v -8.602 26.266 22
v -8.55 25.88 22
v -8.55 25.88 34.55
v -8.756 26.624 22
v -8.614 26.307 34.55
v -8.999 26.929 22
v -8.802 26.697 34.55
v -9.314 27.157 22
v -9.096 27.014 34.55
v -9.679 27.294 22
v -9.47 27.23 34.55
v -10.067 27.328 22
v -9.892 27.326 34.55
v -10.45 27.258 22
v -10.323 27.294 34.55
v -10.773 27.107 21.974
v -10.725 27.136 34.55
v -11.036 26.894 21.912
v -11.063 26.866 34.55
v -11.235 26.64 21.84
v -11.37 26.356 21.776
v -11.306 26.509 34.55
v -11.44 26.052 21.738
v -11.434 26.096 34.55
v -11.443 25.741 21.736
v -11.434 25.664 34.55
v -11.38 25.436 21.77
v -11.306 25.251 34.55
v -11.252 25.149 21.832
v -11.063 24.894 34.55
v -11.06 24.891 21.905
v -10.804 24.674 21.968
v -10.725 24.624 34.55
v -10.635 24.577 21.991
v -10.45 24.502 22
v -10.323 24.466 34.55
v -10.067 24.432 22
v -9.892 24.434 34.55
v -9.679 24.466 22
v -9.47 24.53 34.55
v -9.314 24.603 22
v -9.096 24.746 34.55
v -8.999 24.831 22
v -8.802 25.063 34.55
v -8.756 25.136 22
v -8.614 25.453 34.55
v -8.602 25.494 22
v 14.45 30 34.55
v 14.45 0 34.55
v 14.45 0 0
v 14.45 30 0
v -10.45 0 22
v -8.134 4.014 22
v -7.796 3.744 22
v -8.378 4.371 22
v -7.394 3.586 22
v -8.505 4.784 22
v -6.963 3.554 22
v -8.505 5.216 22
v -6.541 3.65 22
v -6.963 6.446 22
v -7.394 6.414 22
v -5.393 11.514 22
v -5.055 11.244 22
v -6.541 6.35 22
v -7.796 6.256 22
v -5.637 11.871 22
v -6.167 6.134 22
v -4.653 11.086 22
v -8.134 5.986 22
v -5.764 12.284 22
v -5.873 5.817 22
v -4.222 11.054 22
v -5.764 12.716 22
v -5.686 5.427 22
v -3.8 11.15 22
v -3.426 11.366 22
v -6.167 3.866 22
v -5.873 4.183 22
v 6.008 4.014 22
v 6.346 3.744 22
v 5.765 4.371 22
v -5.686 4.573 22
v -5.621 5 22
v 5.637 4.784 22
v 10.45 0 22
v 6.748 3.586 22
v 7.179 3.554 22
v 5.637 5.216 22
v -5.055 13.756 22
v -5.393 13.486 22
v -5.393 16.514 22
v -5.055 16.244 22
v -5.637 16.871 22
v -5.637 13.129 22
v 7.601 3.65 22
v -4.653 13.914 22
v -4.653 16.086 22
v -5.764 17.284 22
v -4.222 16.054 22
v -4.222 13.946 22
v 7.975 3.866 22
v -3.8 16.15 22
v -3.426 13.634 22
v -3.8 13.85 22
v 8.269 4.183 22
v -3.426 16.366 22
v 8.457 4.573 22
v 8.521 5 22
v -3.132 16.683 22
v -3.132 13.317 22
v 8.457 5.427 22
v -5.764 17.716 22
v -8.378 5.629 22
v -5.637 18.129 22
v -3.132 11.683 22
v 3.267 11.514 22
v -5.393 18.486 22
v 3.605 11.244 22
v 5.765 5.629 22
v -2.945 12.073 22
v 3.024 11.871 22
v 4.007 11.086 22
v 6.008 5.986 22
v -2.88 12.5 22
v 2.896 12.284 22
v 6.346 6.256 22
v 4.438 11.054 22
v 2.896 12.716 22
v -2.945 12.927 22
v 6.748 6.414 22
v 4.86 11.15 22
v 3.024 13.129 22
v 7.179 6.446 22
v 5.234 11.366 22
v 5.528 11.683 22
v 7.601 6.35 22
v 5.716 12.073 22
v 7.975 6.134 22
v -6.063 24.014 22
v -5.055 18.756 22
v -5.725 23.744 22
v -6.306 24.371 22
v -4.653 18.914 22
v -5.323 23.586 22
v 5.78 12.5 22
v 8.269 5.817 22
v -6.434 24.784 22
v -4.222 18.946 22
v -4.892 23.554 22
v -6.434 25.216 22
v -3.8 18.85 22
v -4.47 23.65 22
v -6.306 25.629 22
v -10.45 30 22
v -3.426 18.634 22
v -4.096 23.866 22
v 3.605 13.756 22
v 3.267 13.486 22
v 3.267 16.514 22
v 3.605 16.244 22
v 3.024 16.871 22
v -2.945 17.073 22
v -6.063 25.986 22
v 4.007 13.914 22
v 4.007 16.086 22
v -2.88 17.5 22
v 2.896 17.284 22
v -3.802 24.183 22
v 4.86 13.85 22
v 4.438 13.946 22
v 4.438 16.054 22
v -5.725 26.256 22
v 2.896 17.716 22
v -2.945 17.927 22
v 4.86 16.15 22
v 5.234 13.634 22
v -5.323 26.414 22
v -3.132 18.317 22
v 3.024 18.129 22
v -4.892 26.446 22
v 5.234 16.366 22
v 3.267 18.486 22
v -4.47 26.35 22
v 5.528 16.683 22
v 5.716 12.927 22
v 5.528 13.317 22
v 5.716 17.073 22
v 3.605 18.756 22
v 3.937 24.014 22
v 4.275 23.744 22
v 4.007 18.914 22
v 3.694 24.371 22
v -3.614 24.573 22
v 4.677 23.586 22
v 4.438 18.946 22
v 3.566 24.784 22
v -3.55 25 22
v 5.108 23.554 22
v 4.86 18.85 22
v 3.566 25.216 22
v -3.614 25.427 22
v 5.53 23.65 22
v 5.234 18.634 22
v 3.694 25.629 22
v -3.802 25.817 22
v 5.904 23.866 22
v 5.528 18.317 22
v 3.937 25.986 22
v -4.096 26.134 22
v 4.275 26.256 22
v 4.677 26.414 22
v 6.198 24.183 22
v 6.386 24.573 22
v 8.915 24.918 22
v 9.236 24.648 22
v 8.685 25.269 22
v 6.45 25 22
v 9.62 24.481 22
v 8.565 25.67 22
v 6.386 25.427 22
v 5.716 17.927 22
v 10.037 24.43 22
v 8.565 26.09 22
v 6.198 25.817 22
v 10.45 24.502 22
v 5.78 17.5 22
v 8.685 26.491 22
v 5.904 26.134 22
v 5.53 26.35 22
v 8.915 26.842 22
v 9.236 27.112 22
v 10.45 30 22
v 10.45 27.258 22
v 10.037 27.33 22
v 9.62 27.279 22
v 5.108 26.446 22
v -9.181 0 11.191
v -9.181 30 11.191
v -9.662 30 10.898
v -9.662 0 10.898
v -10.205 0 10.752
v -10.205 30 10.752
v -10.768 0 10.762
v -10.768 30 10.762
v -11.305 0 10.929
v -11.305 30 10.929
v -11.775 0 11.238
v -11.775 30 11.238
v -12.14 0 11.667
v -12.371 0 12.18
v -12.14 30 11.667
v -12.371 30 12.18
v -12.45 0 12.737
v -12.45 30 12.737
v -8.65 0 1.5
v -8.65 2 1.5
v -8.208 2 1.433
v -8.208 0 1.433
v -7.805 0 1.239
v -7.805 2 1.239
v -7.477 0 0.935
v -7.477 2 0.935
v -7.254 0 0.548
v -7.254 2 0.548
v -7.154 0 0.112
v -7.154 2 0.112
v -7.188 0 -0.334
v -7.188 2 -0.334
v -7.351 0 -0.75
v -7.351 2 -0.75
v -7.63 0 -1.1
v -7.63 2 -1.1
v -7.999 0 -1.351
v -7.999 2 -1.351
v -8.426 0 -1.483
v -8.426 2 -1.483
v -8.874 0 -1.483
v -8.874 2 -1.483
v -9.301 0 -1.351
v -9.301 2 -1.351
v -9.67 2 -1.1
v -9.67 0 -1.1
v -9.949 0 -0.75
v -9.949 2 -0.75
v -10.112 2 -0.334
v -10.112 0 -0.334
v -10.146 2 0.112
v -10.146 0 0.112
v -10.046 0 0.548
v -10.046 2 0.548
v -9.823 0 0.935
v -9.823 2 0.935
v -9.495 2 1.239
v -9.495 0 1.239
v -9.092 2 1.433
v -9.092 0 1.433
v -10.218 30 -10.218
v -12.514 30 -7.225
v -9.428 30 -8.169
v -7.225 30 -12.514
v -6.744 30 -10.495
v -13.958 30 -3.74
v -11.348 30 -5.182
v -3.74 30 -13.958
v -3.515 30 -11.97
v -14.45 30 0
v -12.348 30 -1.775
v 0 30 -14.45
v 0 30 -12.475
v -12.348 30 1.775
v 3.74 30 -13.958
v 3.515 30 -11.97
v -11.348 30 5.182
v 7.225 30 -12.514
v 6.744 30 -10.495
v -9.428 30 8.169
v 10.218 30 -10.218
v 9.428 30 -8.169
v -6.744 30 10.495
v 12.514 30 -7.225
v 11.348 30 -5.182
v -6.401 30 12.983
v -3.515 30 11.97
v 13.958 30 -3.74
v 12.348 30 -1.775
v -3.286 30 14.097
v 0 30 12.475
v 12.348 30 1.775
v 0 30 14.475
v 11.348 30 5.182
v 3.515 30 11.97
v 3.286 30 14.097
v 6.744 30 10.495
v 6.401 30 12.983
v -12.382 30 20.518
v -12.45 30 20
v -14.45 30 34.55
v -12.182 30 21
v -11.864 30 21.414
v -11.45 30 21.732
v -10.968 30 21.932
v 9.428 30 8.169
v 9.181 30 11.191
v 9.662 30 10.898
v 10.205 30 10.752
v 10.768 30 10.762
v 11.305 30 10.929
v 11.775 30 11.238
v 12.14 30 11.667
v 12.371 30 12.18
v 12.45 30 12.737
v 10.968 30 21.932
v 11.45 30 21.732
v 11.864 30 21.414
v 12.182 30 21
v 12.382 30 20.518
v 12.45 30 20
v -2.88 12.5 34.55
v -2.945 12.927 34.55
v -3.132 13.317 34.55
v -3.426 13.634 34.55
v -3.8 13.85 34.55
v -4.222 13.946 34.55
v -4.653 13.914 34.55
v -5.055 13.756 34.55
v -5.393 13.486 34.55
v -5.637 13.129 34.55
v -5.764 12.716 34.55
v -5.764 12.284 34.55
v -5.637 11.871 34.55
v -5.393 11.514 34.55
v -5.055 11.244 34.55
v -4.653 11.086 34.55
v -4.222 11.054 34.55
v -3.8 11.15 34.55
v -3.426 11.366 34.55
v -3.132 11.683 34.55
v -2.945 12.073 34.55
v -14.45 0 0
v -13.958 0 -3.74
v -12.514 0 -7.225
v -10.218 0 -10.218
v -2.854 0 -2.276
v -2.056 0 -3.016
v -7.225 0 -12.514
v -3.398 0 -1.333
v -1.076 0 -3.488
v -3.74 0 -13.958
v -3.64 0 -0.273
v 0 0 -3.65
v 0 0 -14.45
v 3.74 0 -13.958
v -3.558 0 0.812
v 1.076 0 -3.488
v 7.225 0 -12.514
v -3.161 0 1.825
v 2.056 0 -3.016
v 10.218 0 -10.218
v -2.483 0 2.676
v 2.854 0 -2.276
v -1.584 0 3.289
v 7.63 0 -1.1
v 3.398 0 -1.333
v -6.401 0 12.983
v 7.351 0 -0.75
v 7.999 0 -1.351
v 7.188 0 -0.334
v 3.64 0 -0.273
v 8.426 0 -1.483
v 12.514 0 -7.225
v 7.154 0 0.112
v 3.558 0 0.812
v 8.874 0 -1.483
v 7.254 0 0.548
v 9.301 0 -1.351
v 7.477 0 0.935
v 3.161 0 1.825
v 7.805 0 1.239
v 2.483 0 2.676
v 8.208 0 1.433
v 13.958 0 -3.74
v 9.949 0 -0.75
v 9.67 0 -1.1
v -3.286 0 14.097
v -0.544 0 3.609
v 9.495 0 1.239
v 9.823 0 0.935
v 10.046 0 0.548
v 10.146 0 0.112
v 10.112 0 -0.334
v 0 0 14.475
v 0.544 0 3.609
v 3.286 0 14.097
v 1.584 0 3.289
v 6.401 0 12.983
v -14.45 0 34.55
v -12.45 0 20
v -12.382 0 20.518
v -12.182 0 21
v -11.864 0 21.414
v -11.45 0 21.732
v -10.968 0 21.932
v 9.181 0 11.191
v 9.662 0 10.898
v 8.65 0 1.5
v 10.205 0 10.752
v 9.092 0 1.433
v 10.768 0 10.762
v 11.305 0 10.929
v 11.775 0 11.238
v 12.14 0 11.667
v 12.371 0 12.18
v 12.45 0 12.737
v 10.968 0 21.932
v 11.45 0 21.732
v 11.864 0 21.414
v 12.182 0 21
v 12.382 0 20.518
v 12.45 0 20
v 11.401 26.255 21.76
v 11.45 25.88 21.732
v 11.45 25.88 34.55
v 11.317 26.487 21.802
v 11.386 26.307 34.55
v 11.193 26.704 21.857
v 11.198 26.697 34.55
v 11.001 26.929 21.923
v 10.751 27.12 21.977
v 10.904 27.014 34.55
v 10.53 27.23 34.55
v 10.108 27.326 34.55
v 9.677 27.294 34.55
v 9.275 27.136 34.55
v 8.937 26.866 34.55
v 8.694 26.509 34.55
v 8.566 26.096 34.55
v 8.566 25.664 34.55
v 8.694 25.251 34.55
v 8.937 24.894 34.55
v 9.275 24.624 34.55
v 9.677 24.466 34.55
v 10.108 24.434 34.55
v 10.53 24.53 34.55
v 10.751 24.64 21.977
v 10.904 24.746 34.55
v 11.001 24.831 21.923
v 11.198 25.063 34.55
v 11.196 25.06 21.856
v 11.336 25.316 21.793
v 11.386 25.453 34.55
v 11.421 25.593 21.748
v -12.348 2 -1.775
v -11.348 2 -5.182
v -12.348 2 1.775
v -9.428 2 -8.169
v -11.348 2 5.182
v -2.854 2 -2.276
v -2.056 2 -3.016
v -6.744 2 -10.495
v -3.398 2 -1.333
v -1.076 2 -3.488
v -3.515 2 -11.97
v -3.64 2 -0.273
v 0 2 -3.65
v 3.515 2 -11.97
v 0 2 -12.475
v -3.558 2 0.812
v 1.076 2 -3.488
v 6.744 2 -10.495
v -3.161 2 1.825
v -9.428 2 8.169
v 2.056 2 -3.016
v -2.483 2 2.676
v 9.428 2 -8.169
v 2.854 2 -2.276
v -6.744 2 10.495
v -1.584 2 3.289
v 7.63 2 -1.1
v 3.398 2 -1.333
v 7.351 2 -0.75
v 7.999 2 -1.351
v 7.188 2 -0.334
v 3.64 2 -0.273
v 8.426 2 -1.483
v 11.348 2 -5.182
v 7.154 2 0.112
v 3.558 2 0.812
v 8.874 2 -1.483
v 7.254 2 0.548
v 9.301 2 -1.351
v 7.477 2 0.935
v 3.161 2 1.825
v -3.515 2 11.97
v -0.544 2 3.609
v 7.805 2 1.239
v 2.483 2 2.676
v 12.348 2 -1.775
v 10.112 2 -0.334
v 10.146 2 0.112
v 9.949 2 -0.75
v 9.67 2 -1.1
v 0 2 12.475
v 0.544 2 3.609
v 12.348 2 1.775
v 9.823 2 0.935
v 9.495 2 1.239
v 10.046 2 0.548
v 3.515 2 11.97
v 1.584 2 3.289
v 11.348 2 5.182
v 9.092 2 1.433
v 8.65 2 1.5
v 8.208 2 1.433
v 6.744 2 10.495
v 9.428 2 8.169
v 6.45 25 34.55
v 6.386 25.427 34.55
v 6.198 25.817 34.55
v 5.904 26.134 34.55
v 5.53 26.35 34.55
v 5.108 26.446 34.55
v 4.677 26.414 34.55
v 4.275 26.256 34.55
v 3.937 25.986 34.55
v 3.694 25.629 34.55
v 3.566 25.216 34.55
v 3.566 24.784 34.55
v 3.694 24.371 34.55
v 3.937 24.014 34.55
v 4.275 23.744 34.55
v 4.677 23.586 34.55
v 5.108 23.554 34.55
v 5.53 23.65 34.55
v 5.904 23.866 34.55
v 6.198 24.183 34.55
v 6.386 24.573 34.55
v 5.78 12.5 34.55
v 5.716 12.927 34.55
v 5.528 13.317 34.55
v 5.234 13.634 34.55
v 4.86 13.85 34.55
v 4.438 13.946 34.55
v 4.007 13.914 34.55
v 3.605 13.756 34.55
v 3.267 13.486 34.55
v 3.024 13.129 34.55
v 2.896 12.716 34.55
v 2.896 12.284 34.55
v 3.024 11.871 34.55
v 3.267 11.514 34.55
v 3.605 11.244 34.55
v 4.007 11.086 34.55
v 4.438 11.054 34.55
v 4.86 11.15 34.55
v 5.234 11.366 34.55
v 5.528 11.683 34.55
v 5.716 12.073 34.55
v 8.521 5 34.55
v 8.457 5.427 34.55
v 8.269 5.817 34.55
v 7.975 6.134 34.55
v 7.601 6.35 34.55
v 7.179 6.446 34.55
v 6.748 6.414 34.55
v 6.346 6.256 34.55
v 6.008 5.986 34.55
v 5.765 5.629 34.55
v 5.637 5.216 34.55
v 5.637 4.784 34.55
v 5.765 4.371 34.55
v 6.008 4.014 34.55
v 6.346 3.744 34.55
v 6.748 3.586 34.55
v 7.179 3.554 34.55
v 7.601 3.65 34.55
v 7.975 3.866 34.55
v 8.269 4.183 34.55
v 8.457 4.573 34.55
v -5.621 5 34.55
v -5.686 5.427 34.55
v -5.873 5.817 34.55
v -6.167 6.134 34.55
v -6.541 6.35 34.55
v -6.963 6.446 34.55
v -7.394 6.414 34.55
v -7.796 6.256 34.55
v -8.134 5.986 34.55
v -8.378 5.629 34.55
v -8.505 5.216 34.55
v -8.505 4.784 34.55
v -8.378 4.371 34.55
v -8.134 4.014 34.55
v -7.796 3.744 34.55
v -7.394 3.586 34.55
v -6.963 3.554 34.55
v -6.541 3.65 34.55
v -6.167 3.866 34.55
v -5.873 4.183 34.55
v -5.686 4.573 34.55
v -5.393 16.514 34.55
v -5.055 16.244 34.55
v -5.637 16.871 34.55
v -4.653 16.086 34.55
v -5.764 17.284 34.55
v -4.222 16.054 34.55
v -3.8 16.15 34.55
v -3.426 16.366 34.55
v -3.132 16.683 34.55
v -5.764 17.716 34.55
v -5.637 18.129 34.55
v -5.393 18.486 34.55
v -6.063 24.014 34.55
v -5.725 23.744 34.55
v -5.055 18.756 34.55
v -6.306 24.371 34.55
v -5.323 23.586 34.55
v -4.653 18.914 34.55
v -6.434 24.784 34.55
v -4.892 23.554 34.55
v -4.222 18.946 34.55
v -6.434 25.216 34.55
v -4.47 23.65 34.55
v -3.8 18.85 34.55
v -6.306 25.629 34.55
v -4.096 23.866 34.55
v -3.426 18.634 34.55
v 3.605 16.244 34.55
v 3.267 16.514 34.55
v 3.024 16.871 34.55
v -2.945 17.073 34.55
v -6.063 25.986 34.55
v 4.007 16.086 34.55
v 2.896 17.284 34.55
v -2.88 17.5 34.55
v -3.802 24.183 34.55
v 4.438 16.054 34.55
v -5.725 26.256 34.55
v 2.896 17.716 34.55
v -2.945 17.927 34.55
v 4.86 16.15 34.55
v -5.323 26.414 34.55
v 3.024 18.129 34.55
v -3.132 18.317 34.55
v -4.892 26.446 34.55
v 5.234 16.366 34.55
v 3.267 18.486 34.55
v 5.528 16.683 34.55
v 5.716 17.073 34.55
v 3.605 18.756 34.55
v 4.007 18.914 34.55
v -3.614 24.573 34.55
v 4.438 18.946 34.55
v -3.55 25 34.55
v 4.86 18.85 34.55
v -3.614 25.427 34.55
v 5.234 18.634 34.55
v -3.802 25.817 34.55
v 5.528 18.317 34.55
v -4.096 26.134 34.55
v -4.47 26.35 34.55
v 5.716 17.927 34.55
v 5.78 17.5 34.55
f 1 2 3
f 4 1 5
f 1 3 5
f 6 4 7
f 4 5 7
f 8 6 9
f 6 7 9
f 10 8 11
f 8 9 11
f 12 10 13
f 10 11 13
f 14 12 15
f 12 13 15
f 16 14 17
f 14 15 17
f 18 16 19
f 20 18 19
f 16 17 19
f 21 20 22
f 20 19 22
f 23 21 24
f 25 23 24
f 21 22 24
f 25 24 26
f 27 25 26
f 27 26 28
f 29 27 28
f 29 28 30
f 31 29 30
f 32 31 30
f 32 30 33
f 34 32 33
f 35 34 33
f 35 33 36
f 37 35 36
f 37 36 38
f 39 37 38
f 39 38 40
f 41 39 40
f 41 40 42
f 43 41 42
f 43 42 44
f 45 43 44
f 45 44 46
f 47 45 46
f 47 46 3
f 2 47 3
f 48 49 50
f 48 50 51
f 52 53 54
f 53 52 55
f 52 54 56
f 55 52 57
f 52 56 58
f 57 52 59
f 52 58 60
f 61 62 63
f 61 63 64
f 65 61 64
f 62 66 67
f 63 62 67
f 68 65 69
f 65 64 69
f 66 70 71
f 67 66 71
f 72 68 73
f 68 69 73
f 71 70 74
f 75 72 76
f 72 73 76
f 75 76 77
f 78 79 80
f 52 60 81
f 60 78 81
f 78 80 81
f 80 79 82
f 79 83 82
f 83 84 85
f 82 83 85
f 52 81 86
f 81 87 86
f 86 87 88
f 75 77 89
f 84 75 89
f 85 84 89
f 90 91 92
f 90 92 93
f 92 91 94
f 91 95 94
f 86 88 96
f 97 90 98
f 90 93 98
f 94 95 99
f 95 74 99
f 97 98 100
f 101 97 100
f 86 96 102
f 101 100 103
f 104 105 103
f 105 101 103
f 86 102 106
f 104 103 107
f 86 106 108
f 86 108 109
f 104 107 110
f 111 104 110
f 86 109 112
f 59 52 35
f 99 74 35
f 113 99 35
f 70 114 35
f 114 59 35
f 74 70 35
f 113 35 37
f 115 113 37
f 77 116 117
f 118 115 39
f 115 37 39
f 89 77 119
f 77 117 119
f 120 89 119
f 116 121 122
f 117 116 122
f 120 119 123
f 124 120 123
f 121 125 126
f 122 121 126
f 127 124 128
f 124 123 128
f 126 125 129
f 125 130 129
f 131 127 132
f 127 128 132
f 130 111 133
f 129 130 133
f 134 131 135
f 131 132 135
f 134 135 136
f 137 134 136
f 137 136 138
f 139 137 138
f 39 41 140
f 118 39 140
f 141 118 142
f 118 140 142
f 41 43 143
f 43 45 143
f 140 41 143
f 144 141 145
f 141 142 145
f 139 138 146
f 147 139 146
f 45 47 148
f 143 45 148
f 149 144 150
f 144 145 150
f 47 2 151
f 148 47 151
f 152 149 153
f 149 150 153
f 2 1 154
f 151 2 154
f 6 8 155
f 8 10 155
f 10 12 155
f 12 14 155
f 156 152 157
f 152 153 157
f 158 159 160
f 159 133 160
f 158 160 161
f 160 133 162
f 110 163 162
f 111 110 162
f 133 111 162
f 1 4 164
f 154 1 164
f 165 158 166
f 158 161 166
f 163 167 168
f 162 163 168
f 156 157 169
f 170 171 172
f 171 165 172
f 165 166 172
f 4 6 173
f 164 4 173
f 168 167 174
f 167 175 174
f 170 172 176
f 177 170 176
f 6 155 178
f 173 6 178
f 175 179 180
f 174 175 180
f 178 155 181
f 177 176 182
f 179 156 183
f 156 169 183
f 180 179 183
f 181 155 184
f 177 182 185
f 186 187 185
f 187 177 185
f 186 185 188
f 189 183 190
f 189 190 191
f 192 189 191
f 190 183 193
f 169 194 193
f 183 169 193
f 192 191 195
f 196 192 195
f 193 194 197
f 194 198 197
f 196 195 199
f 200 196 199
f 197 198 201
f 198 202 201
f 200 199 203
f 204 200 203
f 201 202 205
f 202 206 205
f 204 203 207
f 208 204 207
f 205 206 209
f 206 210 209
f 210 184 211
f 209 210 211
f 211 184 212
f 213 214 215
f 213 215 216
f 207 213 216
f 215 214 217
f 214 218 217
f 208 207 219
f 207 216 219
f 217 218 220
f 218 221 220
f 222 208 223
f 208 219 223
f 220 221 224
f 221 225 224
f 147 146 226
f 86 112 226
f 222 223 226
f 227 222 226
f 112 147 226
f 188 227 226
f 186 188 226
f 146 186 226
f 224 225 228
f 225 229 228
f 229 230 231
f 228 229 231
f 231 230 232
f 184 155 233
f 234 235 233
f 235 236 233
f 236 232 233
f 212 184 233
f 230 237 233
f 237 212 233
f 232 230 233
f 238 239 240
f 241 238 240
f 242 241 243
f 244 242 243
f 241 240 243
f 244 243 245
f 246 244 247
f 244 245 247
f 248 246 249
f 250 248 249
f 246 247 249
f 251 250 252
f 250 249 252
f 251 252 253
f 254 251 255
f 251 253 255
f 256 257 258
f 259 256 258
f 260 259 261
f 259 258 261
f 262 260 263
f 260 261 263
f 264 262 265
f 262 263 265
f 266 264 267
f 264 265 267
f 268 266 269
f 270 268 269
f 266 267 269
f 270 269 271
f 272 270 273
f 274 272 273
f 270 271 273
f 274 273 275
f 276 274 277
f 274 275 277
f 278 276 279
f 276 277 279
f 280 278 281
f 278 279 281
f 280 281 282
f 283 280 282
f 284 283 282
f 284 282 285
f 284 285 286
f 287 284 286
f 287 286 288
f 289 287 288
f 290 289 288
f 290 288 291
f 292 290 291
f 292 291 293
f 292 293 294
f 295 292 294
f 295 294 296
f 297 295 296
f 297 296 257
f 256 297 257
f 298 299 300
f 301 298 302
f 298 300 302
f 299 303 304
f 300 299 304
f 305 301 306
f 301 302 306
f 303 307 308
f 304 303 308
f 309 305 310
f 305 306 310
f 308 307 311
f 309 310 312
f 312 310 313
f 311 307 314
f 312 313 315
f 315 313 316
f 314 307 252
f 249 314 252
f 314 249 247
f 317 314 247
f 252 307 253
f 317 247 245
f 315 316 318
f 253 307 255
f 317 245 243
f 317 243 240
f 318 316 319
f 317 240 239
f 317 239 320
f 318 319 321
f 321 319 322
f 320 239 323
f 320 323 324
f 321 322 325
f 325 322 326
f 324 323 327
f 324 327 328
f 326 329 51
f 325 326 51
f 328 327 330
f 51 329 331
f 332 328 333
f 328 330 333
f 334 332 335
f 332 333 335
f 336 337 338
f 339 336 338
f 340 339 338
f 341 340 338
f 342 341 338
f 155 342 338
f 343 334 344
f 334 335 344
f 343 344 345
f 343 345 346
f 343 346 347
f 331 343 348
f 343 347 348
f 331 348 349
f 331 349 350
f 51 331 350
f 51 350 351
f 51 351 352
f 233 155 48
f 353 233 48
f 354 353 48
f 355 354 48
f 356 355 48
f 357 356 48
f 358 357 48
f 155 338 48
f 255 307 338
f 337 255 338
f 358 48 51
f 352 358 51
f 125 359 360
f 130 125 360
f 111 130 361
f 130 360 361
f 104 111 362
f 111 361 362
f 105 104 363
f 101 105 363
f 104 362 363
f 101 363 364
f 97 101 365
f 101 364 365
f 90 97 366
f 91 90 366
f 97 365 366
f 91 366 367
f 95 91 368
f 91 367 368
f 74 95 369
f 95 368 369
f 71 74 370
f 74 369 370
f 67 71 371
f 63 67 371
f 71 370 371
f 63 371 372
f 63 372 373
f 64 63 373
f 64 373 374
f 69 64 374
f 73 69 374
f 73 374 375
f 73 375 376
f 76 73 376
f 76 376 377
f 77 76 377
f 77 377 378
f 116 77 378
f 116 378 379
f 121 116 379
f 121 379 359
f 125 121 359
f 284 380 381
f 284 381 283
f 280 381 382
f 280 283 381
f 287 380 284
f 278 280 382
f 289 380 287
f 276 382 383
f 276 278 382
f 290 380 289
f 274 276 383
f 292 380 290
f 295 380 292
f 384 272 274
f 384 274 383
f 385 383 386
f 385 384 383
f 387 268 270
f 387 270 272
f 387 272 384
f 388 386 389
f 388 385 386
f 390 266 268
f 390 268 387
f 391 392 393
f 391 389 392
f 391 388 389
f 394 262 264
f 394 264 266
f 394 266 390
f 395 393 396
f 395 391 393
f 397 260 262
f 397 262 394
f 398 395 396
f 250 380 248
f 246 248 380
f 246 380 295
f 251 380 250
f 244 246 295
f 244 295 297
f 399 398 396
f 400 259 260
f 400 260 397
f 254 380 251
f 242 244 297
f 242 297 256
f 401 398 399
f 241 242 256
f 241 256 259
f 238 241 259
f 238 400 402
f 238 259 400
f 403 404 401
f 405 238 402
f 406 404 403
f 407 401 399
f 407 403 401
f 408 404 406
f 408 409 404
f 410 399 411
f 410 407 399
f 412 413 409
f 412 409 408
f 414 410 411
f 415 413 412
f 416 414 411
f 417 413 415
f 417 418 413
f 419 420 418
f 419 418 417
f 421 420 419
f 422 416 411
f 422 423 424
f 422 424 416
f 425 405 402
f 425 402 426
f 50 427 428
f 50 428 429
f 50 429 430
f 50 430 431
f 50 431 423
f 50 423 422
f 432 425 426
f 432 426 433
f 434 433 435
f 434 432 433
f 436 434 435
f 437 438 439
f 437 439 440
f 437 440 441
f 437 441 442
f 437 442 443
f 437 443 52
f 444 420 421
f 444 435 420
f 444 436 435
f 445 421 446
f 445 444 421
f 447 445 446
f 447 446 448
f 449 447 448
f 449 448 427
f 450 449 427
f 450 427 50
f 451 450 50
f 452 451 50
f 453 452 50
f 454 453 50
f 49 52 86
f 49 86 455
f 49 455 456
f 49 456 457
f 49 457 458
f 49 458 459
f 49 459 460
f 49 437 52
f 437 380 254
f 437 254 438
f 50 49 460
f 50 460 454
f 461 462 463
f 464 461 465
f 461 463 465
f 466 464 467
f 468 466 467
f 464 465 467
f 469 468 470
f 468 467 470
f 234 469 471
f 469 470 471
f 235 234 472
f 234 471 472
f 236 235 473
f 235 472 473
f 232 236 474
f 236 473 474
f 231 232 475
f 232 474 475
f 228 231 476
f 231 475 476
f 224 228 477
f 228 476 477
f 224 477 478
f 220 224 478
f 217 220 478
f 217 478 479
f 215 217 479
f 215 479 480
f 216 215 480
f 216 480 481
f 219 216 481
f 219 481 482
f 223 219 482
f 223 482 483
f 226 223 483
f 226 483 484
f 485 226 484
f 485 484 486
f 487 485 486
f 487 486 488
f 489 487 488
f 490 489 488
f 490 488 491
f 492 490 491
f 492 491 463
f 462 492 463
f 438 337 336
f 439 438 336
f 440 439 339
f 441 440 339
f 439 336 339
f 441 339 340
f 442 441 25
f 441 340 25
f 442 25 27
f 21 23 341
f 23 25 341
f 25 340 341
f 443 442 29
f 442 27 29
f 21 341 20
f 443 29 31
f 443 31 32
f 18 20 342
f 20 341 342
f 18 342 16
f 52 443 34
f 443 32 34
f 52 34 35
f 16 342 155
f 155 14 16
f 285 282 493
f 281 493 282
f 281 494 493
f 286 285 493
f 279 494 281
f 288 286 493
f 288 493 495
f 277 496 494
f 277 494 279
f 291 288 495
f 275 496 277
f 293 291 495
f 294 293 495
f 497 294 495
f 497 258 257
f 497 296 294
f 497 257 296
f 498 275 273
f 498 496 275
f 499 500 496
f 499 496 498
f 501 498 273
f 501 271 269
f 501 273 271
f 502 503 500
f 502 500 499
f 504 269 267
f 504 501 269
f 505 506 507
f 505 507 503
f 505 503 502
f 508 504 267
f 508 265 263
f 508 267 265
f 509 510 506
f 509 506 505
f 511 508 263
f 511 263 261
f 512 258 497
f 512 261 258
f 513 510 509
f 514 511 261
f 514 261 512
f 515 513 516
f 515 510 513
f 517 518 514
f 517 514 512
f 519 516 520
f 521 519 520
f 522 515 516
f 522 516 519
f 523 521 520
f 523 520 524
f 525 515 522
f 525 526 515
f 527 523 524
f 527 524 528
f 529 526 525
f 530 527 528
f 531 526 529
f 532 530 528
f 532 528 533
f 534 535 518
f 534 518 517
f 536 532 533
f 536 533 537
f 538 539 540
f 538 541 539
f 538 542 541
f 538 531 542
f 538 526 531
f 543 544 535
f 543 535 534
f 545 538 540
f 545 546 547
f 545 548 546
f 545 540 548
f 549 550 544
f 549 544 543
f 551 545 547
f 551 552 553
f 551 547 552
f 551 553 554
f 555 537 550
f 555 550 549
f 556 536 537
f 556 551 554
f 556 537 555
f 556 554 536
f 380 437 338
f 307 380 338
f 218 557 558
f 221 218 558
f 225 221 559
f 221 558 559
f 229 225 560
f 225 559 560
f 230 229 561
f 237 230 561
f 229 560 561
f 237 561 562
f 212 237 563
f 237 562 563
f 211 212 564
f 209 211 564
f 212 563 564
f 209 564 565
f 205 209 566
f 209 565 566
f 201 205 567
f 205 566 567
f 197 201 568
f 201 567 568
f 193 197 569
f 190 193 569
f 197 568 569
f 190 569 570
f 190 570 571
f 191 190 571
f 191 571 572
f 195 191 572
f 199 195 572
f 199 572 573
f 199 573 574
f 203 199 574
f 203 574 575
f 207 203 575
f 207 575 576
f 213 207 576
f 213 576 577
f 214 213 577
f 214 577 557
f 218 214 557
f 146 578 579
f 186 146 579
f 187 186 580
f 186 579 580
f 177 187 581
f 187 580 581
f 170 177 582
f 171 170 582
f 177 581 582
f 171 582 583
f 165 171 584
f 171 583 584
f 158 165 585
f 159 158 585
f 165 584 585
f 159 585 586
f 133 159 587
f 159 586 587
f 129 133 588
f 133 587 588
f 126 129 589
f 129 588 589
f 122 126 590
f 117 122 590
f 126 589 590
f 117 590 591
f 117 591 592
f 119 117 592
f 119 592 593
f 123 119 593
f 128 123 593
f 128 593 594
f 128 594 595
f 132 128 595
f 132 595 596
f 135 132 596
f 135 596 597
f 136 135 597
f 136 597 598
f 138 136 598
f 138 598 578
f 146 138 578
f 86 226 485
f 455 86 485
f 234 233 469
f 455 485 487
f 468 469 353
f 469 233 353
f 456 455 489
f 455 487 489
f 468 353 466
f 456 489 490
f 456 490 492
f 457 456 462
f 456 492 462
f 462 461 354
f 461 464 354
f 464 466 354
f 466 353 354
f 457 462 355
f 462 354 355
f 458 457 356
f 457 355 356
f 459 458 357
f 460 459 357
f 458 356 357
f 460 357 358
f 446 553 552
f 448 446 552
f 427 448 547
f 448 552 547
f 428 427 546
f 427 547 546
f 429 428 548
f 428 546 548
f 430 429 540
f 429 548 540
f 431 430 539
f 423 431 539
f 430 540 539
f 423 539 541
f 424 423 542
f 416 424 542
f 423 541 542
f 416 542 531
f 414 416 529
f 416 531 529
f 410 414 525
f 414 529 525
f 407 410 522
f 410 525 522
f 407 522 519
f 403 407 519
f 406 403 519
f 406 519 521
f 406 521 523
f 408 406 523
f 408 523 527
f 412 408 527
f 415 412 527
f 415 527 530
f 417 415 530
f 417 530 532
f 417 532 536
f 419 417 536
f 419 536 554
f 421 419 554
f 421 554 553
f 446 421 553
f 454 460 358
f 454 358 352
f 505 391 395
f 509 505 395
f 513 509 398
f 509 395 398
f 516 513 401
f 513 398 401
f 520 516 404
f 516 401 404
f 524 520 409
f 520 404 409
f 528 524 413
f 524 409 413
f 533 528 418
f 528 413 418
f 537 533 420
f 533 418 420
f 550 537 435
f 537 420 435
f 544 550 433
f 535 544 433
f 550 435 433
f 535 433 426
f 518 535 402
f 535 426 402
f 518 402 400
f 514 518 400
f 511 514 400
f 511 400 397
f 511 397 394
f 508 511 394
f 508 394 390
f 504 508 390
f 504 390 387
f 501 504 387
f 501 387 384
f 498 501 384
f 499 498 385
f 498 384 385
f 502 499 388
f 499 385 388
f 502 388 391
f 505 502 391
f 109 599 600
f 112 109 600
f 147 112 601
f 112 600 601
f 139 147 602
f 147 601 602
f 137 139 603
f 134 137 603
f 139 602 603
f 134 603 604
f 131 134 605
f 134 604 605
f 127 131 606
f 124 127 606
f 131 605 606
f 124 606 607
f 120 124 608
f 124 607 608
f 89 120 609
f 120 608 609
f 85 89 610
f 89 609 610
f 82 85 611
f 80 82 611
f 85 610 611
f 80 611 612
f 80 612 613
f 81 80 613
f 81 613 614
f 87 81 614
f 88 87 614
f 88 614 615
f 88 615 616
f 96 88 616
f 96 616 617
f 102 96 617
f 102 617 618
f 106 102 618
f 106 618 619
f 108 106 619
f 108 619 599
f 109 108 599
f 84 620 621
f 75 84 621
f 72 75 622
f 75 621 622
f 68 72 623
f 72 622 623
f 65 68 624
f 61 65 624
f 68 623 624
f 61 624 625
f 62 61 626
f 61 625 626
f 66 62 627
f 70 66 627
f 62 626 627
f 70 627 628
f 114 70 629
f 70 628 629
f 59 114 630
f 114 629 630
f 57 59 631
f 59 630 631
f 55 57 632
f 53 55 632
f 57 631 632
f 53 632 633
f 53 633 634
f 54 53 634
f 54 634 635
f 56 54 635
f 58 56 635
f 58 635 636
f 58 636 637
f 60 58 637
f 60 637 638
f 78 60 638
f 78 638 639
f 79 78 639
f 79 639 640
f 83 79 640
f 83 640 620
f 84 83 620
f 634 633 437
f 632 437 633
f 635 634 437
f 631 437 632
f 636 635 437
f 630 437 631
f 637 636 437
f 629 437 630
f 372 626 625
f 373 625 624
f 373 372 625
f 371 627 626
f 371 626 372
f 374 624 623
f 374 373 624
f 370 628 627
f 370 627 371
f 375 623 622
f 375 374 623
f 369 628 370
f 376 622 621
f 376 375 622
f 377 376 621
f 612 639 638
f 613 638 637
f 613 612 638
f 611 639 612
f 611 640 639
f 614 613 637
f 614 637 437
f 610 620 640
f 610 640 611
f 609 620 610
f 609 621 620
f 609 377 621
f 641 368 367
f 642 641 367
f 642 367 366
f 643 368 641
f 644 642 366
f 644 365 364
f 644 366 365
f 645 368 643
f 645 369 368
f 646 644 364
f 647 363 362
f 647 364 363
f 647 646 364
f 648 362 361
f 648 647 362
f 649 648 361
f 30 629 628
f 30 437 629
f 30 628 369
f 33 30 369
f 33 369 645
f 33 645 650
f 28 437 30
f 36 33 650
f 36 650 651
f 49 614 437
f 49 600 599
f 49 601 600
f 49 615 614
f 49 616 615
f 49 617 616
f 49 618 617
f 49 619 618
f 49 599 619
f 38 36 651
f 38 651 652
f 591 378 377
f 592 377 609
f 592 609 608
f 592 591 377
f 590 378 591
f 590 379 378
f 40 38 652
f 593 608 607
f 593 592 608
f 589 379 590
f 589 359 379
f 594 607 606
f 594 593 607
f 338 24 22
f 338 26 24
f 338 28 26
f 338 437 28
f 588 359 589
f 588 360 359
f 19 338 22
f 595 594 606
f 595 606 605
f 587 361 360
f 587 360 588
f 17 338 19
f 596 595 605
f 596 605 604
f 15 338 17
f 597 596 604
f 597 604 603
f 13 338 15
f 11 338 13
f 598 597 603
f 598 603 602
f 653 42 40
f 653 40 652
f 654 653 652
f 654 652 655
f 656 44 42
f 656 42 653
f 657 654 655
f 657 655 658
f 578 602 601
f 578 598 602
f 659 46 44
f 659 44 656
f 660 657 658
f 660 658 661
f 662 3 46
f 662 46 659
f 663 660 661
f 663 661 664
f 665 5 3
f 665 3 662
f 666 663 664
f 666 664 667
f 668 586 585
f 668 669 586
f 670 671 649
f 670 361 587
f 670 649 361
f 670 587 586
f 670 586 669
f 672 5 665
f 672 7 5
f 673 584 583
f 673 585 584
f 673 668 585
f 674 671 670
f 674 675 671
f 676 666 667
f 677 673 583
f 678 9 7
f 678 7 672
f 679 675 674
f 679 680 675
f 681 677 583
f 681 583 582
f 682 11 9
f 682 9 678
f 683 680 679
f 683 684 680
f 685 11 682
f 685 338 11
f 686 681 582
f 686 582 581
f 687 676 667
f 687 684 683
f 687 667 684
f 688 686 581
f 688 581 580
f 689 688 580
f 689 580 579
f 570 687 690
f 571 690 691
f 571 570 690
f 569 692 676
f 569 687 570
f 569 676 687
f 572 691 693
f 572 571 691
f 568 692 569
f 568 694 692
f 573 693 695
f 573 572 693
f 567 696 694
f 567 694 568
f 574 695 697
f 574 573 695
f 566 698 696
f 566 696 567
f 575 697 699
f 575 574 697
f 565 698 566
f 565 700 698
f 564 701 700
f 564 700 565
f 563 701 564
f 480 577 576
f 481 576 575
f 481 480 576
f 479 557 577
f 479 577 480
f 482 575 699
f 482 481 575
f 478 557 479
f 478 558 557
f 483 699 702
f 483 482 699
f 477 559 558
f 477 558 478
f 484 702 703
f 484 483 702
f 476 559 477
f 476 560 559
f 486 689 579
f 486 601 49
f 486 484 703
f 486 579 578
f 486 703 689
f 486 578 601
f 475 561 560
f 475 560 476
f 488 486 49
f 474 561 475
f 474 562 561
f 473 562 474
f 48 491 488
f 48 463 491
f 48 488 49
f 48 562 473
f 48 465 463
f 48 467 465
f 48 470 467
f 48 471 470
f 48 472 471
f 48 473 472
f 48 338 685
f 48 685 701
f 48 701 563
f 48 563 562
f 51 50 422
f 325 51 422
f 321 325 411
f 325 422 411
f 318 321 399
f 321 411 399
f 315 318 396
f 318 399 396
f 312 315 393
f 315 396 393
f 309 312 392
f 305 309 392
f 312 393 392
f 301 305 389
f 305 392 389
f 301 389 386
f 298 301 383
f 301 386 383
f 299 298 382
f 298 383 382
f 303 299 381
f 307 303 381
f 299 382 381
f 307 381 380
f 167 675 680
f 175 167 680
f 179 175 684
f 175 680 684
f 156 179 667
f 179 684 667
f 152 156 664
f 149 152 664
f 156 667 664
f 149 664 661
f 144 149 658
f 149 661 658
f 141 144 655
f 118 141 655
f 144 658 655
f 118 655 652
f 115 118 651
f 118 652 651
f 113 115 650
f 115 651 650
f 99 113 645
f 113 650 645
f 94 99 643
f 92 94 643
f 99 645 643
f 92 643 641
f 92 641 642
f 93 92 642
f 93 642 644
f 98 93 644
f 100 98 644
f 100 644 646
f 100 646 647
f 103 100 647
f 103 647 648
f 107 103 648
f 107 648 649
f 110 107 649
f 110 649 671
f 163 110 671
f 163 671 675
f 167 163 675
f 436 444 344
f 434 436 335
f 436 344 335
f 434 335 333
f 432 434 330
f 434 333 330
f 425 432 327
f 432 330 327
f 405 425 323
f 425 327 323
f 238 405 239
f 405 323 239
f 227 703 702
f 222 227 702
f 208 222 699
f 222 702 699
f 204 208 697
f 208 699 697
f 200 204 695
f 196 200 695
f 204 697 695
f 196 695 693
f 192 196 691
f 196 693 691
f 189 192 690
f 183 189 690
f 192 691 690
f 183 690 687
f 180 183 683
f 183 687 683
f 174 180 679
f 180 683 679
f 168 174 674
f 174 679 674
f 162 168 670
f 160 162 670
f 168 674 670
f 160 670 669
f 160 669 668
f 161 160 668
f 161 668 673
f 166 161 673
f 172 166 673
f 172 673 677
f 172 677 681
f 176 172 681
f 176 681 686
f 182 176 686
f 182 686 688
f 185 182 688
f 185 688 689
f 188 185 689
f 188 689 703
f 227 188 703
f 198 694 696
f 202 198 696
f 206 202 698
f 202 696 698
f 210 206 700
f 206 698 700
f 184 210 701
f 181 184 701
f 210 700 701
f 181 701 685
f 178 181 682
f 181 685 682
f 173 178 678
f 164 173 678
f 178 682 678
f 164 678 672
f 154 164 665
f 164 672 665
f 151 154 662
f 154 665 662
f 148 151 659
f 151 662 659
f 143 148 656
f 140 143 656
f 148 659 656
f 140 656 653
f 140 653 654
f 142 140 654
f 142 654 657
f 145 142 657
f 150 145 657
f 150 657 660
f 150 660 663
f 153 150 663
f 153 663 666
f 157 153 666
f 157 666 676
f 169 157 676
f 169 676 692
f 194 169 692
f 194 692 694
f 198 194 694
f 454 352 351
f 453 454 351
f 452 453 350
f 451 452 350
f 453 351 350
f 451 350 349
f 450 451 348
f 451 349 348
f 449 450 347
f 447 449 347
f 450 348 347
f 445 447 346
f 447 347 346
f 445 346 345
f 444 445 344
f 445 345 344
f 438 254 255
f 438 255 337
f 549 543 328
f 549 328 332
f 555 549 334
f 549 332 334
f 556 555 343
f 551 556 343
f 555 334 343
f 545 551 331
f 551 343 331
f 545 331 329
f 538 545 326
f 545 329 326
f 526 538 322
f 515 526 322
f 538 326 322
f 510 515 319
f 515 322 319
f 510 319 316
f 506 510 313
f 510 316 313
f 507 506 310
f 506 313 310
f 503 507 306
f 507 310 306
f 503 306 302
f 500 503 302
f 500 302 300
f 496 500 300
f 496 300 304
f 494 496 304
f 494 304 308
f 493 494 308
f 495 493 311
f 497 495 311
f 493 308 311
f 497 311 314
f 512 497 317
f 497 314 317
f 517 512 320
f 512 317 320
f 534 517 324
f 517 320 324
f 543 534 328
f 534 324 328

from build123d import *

# Parameters (mm, degrees)
CROQUIS1_R              = 14.45
SALIENTE_EXTRUIR1_DEPTH = 30
CROQUIS3_W              = 28.9
CROQUIS3_H              = 18.45
SALIENTE_EXTRUIR2_DEPTH = 30
CROQUIS4_R              = 12.475
CORTAR_EXTRUIR2_DEPTH   = 28
CROQUIS6_R              = 1.5
CORTAR_EXTRUIR4_DEPTH   = 28
CROQUIS7_R              = 1.45
CORTAR_EXTRUIR5_DEPTH   = 3
CROQUIS8_R              = 3.65
CORTAR_EXTRUIR6_DEPTH   = 2
SALIENTE_EXTRUIR4_START = 16.1
CROQUIS9_W              = 28.9
CROQUIS9_H              = 30
CROQUIS9_R              = 1.45
SALIENTE_EXTRUIR4_DEPTH = 16.1
CORTAR_EXTRUIR7_DEPTH   = 48.984424556


with BuildPart() as part:
    # Croquis1 → Saliente-Extruir1 (new body)
    with BuildSketch(Plane(origin=(0, 0, 0), x_dir=(1, 0, 0), z_dir=(0, 1, 0))):
        Circle(CROQUIS1_R)
    extrude(amount=SALIENTE_EXTRUIR1_DEPTH)

    # Croquis3 → Saliente-Extruir2 (add)
    with BuildSketch(Plane(origin=(0, 0, 0), x_dir=(1, 0, 0), z_dir=(0, 1, 0))):
        with Locations((0, -9.225)):
            Rectangle(CROQUIS3_W, CROQUIS3_H)
    extrude(amount=SALIENTE_EXTRUIR2_DEPTH)

    # Croquis4 → Cortar-Extruir2 (cut)
    with BuildSketch(Plane(origin=(0, 30, 0), x_dir=(1, 0, 0), z_dir=(0, 1, 0))):
        Circle(CROQUIS4_R)
    extrude(amount=-CORTAR_EXTRUIR2_DEPTH, mode=Mode.SUBTRACT)

    # Croquis6 → Cortar-Extruir4 (cut)
    with BuildSketch(Plane(origin=(0, 2, 0), x_dir=(1, 0, 0), z_dir=(0, 1, 0))):
        with Locations((8.65, 0)):
            Circle(CROQUIS6_R)
        with Locations((-8.65, 0)):
            Circle(CROQUIS6_R)
    extrude(amount=-CORTAR_EXTRUIR4_DEPTH, mode=Mode.SUBTRACT)

    # Croquis7 → Cortar-Extruir5 (cut)
    with BuildSketch(Plane.XY.offset(18.45)):
        with Locations((-5, 25)):
            Circle(CROQUIS7_R)
        with Locations((5, 25)):
            Circle(CROQUIS7_R)
        with Locations((-7.0711, 5)):
            Circle(CROQUIS7_R)
        with Locations((7.0711, 5)):
            Circle(CROQUIS7_R)
        with Locations((-4.330127019, 17.5)):
            Circle(CROQUIS7_R)
        with Locations((4.330127019, 12.5)):
            Circle(CROQUIS7_R)
        with Locations((-10, 25.88)):
            Circle(CROQUIS7_R)
        with Locations((10, 25.88)):
            Circle(CROQUIS7_R)
        with Locations((-4.330127019, 12.5)):
            Circle(CROQUIS7_R)
        with Locations((4.330127019, 17.5)):
            Circle(CROQUIS7_R)
    extrude(amount=-CORTAR_EXTRUIR5_DEPTH, mode=Mode.SUBTRACT)

    # Croquis8 → Cortar-Extruir6 (cut)
    with BuildSketch(Plane.XZ):
        Circle(CROQUIS8_R)
    extrude(amount=-CORTAR_EXTRUIR6_DEPTH, mode=Mode.SUBTRACT)

    # Croquis9 → Saliente-Extruir4 (add)
    with BuildSketch(Plane.XY.offset(18.45).offset(SALIENTE_EXTRUIR4_START)):
        with Locations((0, 15)):
            Rectangle(CROQUIS9_W, CROQUIS9_H)
        with Locations((-4.330127019, 12.5)):
            Circle(CROQUIS9_R, mode=Mode.SUBTRACT)
        with Locations((4.330127019, 17.5)):
            Circle(CROQUIS9_R, mode=Mode.SUBTRACT)
        with Locations((-5, 25)):
            Circle(CROQUIS9_R, mode=Mode.SUBTRACT)
        with Locations((5, 25)):
            Circle(CROQUIS9_R, mode=Mode.SUBTRACT)
        with Locations((-7.0711, 5)):
            Circle(CROQUIS9_R, mode=Mode.SUBTRACT)
        with Locations((7.0711, 5)):
            Circle(CROQUIS9_R, mode=Mode.SUBTRACT)
        with Locations((-4.330127019, 17.5)):
            Circle(CROQUIS9_R, mode=Mode.SUBTRACT)
        with Locations((4.330127019, 12.5)):
            Circle(CROQUIS9_R, mode=Mode.SUBTRACT)
        with Locations((-10, 25.88)):
            Circle(CROQUIS9_R, mode=Mode.SUBTRACT)
        with Locations((10, 25.88)):
            Circle(CROQUIS9_R, mode=Mode.SUBTRACT)
    extrude(amount=-SALIENTE_EXTRUIR4_DEPTH)

    # Croquis10 → Cortar-Extruir7 (cut, through all)
    with BuildSketch(Plane(origin=(0, 30, 0), x_dir=(1, 0, 0), z_dir=(0, 1, 0))):
        with BuildLine():
            Line((-10.45, -22), (10.45, -22))
            ThreePointArc((10.45, -22), (11.864213562, -21.414213562), (12.45, -20))
            Line((12.45, -20), (12.45, -12.736684223))
            ThreePointArc((12.45, -12.736684223), (11.305225835, -10.928760339), (9.181411229, -11.190501009))
            ThreePointArc((9.181411229, -11.190501009), (0, -14.475), (-9.181411229, -11.190501009))
            ThreePointArc((-9.181411229, -11.190501009), (-11.305225835, -10.928760339), (-12.45, -12.736684223))
            Line((-12.45, -12.736684223), (-12.45, -20))
            ThreePointArc((-12.45, -20), (-11.864213562, -21.414213562), (-10.45, -22))
        make_face()
    extrude(amount=-CORTAR_EXTRUIR7_DEPTH, mode=Mode.SUBTRACT)


solid = part.part
